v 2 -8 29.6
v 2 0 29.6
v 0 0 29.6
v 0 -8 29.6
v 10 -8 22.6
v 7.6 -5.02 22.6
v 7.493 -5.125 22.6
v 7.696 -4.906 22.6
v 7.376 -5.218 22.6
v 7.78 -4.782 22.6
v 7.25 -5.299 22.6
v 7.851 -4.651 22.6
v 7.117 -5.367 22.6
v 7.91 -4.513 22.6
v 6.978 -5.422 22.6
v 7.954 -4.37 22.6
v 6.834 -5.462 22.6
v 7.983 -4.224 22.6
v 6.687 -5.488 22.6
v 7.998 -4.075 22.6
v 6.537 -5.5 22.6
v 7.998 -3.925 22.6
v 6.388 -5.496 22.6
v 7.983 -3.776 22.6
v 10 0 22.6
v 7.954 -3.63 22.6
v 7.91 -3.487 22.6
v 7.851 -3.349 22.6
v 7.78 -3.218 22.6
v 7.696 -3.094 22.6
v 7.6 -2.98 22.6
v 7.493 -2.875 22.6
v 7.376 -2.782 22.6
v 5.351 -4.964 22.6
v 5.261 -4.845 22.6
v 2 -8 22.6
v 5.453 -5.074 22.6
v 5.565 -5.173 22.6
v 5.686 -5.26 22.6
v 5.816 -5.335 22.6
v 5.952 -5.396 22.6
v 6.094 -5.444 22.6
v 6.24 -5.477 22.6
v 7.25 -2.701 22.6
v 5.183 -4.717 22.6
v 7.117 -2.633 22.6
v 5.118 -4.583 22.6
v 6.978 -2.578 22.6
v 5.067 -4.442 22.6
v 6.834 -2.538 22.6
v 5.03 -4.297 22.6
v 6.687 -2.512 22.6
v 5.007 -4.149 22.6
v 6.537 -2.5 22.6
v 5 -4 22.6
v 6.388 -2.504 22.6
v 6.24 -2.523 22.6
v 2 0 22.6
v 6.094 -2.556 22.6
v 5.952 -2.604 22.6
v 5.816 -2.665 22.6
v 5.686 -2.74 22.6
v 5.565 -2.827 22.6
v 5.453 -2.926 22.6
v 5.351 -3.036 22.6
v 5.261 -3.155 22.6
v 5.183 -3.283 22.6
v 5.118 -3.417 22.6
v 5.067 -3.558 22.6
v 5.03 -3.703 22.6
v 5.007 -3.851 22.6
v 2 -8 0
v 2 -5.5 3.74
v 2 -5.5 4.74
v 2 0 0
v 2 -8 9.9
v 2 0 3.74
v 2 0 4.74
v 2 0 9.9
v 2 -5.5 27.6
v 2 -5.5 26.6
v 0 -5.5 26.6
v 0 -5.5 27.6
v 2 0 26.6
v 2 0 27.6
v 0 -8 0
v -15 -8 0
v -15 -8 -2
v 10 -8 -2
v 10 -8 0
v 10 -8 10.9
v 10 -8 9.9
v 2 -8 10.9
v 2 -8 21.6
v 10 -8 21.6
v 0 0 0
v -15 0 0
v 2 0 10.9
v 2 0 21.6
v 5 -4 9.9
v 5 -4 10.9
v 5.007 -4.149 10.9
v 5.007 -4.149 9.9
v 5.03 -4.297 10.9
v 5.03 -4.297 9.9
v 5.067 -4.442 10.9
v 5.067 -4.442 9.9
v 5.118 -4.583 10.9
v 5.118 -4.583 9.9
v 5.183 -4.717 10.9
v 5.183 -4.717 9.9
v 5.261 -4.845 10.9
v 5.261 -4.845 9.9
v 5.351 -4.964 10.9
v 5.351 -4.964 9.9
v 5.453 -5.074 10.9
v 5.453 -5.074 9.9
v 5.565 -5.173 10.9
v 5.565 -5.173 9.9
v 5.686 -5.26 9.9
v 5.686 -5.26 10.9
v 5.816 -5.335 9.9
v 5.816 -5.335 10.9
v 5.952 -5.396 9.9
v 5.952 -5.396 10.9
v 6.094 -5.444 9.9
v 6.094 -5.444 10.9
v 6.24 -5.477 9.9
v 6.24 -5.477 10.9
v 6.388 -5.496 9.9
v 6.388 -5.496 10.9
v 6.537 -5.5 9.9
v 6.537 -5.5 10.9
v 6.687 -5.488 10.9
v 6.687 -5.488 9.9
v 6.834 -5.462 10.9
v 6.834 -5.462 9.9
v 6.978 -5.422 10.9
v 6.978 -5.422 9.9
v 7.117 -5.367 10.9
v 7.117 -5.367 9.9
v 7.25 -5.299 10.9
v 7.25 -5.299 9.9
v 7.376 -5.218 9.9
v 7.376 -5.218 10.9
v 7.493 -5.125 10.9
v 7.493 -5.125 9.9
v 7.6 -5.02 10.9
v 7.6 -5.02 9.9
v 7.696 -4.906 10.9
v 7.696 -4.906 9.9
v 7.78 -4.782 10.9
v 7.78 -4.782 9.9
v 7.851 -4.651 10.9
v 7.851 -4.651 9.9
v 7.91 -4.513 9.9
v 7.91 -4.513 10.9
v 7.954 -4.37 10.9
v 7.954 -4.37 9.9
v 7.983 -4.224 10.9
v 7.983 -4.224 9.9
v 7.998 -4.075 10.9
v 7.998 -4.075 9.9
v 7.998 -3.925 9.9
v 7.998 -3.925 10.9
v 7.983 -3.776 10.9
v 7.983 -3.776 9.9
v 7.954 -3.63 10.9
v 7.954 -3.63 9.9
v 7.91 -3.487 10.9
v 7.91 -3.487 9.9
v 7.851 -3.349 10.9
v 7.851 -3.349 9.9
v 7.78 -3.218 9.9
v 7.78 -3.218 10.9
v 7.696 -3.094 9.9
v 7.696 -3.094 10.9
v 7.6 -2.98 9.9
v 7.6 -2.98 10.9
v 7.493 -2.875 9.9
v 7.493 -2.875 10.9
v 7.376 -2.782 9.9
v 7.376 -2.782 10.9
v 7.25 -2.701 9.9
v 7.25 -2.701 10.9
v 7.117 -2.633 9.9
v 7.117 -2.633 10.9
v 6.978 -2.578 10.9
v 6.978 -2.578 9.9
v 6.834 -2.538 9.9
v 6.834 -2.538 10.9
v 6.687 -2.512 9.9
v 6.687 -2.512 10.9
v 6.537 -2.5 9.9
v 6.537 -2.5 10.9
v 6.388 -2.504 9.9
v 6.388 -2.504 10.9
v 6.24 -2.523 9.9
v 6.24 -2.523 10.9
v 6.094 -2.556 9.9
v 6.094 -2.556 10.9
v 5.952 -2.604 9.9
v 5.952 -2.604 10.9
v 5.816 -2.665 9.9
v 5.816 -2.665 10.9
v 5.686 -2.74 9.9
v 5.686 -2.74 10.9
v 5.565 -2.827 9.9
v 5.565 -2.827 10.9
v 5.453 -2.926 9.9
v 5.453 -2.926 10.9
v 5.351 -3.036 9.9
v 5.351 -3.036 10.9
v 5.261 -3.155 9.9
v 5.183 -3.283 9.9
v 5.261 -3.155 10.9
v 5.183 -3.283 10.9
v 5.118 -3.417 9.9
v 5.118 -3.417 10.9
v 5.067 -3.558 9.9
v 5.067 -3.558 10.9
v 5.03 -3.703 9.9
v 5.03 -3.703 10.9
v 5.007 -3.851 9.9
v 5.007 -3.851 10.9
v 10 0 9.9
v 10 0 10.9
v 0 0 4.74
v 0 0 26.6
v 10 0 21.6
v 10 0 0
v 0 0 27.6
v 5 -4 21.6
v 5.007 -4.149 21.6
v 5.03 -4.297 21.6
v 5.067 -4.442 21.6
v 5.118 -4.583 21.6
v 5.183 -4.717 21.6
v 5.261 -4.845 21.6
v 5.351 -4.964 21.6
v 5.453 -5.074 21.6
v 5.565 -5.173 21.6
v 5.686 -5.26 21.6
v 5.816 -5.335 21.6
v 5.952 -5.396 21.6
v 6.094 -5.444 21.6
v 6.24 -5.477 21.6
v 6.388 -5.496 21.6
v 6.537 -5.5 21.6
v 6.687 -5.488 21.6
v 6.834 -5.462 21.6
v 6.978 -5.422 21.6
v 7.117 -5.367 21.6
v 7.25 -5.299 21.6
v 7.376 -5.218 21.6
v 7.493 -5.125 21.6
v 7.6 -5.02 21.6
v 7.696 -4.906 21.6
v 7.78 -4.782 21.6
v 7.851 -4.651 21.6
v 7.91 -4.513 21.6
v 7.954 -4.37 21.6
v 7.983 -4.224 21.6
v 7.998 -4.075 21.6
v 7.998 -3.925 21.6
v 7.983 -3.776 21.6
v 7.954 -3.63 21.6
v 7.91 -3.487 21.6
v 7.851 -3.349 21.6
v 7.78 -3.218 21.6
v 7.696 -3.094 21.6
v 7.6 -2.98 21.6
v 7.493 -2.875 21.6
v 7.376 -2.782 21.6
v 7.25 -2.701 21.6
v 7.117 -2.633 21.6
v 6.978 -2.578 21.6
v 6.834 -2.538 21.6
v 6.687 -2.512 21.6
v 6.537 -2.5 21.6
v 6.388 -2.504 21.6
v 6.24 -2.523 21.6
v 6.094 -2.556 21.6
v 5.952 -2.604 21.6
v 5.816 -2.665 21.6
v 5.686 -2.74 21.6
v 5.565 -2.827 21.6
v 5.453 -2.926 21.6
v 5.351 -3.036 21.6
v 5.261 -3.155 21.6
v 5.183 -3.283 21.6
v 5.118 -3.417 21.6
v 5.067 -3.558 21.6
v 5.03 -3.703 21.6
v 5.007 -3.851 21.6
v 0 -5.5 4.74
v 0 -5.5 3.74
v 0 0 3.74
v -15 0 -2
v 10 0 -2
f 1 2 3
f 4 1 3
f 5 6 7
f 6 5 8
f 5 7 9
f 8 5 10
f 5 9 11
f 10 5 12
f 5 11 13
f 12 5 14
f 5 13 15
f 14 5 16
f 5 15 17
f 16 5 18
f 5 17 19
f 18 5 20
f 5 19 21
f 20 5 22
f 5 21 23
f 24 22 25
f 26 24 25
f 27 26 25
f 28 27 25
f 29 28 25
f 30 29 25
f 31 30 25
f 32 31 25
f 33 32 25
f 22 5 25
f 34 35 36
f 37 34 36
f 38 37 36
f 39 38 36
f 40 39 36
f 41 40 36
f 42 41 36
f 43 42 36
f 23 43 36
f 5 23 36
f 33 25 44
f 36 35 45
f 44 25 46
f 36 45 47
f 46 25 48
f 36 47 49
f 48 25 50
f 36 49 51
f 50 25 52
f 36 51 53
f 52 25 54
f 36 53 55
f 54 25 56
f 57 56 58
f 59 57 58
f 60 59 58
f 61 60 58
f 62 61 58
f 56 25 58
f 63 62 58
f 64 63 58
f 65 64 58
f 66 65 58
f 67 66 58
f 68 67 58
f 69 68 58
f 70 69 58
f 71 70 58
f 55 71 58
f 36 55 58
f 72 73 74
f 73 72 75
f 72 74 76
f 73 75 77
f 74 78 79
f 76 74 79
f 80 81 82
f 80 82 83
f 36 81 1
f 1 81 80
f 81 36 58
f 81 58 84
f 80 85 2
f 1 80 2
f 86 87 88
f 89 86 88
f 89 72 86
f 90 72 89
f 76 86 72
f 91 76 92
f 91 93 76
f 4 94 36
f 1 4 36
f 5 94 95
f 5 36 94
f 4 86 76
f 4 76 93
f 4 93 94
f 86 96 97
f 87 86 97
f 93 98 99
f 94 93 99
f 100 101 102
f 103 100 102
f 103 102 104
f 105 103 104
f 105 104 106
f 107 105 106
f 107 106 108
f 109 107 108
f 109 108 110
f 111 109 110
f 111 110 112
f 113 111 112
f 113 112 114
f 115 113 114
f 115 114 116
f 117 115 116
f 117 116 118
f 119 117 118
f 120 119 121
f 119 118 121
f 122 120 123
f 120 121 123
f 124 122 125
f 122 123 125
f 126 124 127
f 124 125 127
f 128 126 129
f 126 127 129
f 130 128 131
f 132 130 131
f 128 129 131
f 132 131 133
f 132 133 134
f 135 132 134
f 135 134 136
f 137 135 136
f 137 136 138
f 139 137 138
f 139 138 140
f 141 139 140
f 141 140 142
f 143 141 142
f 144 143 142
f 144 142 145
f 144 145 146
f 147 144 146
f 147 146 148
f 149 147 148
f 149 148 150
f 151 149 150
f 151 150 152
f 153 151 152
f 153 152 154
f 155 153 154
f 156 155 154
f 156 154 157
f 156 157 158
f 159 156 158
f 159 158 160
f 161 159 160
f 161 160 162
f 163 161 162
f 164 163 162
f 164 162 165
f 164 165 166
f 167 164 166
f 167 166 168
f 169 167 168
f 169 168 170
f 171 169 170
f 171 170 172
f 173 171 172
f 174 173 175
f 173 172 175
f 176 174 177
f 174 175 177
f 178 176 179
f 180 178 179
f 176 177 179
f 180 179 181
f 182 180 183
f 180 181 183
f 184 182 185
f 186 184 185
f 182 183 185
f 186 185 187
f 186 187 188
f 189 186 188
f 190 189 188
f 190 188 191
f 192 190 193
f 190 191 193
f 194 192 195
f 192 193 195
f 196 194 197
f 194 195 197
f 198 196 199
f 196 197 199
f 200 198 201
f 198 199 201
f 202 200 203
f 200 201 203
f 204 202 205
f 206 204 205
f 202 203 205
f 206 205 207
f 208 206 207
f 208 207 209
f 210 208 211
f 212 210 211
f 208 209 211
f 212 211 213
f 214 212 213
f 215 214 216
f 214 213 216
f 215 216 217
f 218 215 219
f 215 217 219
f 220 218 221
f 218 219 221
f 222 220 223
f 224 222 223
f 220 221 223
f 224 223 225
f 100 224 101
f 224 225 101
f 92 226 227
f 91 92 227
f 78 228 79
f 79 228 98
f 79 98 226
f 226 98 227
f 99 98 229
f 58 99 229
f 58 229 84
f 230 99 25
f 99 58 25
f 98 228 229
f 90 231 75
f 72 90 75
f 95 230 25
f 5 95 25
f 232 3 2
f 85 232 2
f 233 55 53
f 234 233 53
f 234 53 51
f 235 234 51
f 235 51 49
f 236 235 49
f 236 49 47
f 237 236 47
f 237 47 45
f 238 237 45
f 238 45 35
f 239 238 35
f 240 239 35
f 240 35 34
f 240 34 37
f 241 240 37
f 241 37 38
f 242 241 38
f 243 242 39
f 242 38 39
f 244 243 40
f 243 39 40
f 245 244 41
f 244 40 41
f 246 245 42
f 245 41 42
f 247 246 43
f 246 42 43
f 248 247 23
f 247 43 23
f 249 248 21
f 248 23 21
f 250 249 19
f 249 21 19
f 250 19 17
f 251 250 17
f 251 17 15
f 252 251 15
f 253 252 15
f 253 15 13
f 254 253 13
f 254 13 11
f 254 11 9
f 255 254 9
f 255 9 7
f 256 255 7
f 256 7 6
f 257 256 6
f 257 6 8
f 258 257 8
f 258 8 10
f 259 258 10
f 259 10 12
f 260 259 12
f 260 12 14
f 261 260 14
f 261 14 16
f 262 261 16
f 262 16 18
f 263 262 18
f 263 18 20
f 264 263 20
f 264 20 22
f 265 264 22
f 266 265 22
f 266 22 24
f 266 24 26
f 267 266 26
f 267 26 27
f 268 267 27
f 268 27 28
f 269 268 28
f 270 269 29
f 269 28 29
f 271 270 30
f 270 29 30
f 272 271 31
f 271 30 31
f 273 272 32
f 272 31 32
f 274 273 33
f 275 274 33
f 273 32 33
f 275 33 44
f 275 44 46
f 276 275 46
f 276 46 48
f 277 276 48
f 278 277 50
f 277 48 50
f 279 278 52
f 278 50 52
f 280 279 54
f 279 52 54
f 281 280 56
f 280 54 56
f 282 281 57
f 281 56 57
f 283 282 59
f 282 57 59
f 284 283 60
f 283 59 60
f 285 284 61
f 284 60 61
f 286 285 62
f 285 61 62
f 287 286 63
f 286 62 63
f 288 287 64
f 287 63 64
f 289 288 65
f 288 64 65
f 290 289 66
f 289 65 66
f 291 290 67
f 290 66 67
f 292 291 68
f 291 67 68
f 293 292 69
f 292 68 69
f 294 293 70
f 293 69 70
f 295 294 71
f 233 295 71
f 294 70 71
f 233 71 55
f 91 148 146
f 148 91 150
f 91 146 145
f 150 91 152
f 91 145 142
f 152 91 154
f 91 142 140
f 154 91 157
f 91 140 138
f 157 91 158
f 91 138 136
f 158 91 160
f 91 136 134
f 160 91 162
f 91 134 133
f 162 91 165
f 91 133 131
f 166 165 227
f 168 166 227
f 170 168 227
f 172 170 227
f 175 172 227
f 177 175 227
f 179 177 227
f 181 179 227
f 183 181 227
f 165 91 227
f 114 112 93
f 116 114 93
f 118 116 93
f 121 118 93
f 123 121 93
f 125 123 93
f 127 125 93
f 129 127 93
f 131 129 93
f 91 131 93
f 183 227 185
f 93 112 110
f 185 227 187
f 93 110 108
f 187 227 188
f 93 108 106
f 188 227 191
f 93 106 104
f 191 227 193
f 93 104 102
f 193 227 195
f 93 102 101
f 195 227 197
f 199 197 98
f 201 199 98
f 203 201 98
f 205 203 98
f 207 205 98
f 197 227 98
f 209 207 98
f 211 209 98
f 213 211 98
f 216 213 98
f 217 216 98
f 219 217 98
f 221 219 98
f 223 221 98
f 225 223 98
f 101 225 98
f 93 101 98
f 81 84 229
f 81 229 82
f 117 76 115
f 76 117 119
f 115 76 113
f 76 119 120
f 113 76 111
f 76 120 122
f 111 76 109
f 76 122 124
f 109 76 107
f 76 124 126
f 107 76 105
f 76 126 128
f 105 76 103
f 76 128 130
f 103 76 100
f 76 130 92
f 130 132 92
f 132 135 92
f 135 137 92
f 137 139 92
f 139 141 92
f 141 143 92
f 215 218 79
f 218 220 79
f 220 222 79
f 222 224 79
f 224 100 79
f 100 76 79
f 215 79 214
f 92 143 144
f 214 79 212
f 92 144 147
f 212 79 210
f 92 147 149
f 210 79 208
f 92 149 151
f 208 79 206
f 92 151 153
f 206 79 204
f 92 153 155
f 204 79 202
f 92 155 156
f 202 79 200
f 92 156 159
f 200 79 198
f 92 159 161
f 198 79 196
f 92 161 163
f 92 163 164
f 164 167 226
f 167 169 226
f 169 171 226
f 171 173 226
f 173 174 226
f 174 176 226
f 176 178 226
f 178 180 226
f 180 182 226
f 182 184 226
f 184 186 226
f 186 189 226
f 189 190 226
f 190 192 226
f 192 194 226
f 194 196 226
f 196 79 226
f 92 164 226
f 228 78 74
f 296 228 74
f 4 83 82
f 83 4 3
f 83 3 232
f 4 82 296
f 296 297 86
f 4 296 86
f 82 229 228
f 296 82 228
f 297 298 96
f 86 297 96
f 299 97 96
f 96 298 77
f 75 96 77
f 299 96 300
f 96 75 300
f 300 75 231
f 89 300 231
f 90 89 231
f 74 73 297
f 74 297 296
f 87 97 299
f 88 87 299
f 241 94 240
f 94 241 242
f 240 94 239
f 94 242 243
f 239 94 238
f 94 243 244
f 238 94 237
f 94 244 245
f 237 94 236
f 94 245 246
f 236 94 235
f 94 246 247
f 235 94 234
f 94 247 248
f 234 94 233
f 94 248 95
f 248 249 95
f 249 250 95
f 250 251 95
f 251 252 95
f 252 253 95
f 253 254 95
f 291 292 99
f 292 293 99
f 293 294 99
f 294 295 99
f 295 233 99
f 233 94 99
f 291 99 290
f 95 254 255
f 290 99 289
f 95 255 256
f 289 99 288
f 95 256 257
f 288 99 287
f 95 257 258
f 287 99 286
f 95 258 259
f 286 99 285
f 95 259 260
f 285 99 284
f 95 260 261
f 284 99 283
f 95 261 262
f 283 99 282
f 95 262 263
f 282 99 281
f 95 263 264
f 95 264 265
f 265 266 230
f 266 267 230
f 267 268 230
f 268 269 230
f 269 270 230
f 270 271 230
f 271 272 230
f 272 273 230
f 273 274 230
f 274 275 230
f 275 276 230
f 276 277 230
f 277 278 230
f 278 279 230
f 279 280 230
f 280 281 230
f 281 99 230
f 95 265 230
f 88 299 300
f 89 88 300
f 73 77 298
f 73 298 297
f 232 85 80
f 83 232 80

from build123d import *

# Parameters (mm, degrees)
PAD_DEPTH       = 8
SKETCH001_R     = 1.5
POCKET_DEPTH    = 14
SKETCH002_W     = 1
SKETCH002_H     = 10
POCKET001_DEPTH = 5


with BuildPart() as part:
    # Sketch → Pad (new body)
    with BuildSketch(Plane.XZ):
        Polygon((-15, -2), (10, -2), (10, 0), (2, 0), (2, 9.9), (10, 9.9), (10, 10.9), (2, 10.9), (2, 21.6), (10, 21.6), (10, 22.6), (2, 22.6), (2, 29.6), (0, 29.6), (0, 0), (-15, 0), align=None)
    extrude(amount=PAD_DEPTH)

    # Sketch001 → Pocket (cut)
    with BuildSketch(Plane(origin=(0, 0, 22.6), x_dir=(-1, 0, 0), z_dir=(0, 0, 1))):
        with Locations((-6.5, 4)):
            Circle(SKETCH001_R)
    extrude(amount=-POCKET_DEPTH, mode=Mode.SUBTRACT)

    # Sketch002 → Pocket001 (cut)
    with BuildSketch(Plane(origin=(2, 0, 0), x_dir=(0, 0, 1), z_dir=(1, 0, 0))):
        with Locations((27.1, 0.5)):
            Rectangle(SKETCH002_W, SKETCH002_H)
        with Locations((4.24, 0.5)):
            Rectangle(SKETCH002_W, SKETCH002_H)
    extrude(amount=-POCKET001_DEPTH, mode=Mode.SUBTRACT)


solid = part.part
